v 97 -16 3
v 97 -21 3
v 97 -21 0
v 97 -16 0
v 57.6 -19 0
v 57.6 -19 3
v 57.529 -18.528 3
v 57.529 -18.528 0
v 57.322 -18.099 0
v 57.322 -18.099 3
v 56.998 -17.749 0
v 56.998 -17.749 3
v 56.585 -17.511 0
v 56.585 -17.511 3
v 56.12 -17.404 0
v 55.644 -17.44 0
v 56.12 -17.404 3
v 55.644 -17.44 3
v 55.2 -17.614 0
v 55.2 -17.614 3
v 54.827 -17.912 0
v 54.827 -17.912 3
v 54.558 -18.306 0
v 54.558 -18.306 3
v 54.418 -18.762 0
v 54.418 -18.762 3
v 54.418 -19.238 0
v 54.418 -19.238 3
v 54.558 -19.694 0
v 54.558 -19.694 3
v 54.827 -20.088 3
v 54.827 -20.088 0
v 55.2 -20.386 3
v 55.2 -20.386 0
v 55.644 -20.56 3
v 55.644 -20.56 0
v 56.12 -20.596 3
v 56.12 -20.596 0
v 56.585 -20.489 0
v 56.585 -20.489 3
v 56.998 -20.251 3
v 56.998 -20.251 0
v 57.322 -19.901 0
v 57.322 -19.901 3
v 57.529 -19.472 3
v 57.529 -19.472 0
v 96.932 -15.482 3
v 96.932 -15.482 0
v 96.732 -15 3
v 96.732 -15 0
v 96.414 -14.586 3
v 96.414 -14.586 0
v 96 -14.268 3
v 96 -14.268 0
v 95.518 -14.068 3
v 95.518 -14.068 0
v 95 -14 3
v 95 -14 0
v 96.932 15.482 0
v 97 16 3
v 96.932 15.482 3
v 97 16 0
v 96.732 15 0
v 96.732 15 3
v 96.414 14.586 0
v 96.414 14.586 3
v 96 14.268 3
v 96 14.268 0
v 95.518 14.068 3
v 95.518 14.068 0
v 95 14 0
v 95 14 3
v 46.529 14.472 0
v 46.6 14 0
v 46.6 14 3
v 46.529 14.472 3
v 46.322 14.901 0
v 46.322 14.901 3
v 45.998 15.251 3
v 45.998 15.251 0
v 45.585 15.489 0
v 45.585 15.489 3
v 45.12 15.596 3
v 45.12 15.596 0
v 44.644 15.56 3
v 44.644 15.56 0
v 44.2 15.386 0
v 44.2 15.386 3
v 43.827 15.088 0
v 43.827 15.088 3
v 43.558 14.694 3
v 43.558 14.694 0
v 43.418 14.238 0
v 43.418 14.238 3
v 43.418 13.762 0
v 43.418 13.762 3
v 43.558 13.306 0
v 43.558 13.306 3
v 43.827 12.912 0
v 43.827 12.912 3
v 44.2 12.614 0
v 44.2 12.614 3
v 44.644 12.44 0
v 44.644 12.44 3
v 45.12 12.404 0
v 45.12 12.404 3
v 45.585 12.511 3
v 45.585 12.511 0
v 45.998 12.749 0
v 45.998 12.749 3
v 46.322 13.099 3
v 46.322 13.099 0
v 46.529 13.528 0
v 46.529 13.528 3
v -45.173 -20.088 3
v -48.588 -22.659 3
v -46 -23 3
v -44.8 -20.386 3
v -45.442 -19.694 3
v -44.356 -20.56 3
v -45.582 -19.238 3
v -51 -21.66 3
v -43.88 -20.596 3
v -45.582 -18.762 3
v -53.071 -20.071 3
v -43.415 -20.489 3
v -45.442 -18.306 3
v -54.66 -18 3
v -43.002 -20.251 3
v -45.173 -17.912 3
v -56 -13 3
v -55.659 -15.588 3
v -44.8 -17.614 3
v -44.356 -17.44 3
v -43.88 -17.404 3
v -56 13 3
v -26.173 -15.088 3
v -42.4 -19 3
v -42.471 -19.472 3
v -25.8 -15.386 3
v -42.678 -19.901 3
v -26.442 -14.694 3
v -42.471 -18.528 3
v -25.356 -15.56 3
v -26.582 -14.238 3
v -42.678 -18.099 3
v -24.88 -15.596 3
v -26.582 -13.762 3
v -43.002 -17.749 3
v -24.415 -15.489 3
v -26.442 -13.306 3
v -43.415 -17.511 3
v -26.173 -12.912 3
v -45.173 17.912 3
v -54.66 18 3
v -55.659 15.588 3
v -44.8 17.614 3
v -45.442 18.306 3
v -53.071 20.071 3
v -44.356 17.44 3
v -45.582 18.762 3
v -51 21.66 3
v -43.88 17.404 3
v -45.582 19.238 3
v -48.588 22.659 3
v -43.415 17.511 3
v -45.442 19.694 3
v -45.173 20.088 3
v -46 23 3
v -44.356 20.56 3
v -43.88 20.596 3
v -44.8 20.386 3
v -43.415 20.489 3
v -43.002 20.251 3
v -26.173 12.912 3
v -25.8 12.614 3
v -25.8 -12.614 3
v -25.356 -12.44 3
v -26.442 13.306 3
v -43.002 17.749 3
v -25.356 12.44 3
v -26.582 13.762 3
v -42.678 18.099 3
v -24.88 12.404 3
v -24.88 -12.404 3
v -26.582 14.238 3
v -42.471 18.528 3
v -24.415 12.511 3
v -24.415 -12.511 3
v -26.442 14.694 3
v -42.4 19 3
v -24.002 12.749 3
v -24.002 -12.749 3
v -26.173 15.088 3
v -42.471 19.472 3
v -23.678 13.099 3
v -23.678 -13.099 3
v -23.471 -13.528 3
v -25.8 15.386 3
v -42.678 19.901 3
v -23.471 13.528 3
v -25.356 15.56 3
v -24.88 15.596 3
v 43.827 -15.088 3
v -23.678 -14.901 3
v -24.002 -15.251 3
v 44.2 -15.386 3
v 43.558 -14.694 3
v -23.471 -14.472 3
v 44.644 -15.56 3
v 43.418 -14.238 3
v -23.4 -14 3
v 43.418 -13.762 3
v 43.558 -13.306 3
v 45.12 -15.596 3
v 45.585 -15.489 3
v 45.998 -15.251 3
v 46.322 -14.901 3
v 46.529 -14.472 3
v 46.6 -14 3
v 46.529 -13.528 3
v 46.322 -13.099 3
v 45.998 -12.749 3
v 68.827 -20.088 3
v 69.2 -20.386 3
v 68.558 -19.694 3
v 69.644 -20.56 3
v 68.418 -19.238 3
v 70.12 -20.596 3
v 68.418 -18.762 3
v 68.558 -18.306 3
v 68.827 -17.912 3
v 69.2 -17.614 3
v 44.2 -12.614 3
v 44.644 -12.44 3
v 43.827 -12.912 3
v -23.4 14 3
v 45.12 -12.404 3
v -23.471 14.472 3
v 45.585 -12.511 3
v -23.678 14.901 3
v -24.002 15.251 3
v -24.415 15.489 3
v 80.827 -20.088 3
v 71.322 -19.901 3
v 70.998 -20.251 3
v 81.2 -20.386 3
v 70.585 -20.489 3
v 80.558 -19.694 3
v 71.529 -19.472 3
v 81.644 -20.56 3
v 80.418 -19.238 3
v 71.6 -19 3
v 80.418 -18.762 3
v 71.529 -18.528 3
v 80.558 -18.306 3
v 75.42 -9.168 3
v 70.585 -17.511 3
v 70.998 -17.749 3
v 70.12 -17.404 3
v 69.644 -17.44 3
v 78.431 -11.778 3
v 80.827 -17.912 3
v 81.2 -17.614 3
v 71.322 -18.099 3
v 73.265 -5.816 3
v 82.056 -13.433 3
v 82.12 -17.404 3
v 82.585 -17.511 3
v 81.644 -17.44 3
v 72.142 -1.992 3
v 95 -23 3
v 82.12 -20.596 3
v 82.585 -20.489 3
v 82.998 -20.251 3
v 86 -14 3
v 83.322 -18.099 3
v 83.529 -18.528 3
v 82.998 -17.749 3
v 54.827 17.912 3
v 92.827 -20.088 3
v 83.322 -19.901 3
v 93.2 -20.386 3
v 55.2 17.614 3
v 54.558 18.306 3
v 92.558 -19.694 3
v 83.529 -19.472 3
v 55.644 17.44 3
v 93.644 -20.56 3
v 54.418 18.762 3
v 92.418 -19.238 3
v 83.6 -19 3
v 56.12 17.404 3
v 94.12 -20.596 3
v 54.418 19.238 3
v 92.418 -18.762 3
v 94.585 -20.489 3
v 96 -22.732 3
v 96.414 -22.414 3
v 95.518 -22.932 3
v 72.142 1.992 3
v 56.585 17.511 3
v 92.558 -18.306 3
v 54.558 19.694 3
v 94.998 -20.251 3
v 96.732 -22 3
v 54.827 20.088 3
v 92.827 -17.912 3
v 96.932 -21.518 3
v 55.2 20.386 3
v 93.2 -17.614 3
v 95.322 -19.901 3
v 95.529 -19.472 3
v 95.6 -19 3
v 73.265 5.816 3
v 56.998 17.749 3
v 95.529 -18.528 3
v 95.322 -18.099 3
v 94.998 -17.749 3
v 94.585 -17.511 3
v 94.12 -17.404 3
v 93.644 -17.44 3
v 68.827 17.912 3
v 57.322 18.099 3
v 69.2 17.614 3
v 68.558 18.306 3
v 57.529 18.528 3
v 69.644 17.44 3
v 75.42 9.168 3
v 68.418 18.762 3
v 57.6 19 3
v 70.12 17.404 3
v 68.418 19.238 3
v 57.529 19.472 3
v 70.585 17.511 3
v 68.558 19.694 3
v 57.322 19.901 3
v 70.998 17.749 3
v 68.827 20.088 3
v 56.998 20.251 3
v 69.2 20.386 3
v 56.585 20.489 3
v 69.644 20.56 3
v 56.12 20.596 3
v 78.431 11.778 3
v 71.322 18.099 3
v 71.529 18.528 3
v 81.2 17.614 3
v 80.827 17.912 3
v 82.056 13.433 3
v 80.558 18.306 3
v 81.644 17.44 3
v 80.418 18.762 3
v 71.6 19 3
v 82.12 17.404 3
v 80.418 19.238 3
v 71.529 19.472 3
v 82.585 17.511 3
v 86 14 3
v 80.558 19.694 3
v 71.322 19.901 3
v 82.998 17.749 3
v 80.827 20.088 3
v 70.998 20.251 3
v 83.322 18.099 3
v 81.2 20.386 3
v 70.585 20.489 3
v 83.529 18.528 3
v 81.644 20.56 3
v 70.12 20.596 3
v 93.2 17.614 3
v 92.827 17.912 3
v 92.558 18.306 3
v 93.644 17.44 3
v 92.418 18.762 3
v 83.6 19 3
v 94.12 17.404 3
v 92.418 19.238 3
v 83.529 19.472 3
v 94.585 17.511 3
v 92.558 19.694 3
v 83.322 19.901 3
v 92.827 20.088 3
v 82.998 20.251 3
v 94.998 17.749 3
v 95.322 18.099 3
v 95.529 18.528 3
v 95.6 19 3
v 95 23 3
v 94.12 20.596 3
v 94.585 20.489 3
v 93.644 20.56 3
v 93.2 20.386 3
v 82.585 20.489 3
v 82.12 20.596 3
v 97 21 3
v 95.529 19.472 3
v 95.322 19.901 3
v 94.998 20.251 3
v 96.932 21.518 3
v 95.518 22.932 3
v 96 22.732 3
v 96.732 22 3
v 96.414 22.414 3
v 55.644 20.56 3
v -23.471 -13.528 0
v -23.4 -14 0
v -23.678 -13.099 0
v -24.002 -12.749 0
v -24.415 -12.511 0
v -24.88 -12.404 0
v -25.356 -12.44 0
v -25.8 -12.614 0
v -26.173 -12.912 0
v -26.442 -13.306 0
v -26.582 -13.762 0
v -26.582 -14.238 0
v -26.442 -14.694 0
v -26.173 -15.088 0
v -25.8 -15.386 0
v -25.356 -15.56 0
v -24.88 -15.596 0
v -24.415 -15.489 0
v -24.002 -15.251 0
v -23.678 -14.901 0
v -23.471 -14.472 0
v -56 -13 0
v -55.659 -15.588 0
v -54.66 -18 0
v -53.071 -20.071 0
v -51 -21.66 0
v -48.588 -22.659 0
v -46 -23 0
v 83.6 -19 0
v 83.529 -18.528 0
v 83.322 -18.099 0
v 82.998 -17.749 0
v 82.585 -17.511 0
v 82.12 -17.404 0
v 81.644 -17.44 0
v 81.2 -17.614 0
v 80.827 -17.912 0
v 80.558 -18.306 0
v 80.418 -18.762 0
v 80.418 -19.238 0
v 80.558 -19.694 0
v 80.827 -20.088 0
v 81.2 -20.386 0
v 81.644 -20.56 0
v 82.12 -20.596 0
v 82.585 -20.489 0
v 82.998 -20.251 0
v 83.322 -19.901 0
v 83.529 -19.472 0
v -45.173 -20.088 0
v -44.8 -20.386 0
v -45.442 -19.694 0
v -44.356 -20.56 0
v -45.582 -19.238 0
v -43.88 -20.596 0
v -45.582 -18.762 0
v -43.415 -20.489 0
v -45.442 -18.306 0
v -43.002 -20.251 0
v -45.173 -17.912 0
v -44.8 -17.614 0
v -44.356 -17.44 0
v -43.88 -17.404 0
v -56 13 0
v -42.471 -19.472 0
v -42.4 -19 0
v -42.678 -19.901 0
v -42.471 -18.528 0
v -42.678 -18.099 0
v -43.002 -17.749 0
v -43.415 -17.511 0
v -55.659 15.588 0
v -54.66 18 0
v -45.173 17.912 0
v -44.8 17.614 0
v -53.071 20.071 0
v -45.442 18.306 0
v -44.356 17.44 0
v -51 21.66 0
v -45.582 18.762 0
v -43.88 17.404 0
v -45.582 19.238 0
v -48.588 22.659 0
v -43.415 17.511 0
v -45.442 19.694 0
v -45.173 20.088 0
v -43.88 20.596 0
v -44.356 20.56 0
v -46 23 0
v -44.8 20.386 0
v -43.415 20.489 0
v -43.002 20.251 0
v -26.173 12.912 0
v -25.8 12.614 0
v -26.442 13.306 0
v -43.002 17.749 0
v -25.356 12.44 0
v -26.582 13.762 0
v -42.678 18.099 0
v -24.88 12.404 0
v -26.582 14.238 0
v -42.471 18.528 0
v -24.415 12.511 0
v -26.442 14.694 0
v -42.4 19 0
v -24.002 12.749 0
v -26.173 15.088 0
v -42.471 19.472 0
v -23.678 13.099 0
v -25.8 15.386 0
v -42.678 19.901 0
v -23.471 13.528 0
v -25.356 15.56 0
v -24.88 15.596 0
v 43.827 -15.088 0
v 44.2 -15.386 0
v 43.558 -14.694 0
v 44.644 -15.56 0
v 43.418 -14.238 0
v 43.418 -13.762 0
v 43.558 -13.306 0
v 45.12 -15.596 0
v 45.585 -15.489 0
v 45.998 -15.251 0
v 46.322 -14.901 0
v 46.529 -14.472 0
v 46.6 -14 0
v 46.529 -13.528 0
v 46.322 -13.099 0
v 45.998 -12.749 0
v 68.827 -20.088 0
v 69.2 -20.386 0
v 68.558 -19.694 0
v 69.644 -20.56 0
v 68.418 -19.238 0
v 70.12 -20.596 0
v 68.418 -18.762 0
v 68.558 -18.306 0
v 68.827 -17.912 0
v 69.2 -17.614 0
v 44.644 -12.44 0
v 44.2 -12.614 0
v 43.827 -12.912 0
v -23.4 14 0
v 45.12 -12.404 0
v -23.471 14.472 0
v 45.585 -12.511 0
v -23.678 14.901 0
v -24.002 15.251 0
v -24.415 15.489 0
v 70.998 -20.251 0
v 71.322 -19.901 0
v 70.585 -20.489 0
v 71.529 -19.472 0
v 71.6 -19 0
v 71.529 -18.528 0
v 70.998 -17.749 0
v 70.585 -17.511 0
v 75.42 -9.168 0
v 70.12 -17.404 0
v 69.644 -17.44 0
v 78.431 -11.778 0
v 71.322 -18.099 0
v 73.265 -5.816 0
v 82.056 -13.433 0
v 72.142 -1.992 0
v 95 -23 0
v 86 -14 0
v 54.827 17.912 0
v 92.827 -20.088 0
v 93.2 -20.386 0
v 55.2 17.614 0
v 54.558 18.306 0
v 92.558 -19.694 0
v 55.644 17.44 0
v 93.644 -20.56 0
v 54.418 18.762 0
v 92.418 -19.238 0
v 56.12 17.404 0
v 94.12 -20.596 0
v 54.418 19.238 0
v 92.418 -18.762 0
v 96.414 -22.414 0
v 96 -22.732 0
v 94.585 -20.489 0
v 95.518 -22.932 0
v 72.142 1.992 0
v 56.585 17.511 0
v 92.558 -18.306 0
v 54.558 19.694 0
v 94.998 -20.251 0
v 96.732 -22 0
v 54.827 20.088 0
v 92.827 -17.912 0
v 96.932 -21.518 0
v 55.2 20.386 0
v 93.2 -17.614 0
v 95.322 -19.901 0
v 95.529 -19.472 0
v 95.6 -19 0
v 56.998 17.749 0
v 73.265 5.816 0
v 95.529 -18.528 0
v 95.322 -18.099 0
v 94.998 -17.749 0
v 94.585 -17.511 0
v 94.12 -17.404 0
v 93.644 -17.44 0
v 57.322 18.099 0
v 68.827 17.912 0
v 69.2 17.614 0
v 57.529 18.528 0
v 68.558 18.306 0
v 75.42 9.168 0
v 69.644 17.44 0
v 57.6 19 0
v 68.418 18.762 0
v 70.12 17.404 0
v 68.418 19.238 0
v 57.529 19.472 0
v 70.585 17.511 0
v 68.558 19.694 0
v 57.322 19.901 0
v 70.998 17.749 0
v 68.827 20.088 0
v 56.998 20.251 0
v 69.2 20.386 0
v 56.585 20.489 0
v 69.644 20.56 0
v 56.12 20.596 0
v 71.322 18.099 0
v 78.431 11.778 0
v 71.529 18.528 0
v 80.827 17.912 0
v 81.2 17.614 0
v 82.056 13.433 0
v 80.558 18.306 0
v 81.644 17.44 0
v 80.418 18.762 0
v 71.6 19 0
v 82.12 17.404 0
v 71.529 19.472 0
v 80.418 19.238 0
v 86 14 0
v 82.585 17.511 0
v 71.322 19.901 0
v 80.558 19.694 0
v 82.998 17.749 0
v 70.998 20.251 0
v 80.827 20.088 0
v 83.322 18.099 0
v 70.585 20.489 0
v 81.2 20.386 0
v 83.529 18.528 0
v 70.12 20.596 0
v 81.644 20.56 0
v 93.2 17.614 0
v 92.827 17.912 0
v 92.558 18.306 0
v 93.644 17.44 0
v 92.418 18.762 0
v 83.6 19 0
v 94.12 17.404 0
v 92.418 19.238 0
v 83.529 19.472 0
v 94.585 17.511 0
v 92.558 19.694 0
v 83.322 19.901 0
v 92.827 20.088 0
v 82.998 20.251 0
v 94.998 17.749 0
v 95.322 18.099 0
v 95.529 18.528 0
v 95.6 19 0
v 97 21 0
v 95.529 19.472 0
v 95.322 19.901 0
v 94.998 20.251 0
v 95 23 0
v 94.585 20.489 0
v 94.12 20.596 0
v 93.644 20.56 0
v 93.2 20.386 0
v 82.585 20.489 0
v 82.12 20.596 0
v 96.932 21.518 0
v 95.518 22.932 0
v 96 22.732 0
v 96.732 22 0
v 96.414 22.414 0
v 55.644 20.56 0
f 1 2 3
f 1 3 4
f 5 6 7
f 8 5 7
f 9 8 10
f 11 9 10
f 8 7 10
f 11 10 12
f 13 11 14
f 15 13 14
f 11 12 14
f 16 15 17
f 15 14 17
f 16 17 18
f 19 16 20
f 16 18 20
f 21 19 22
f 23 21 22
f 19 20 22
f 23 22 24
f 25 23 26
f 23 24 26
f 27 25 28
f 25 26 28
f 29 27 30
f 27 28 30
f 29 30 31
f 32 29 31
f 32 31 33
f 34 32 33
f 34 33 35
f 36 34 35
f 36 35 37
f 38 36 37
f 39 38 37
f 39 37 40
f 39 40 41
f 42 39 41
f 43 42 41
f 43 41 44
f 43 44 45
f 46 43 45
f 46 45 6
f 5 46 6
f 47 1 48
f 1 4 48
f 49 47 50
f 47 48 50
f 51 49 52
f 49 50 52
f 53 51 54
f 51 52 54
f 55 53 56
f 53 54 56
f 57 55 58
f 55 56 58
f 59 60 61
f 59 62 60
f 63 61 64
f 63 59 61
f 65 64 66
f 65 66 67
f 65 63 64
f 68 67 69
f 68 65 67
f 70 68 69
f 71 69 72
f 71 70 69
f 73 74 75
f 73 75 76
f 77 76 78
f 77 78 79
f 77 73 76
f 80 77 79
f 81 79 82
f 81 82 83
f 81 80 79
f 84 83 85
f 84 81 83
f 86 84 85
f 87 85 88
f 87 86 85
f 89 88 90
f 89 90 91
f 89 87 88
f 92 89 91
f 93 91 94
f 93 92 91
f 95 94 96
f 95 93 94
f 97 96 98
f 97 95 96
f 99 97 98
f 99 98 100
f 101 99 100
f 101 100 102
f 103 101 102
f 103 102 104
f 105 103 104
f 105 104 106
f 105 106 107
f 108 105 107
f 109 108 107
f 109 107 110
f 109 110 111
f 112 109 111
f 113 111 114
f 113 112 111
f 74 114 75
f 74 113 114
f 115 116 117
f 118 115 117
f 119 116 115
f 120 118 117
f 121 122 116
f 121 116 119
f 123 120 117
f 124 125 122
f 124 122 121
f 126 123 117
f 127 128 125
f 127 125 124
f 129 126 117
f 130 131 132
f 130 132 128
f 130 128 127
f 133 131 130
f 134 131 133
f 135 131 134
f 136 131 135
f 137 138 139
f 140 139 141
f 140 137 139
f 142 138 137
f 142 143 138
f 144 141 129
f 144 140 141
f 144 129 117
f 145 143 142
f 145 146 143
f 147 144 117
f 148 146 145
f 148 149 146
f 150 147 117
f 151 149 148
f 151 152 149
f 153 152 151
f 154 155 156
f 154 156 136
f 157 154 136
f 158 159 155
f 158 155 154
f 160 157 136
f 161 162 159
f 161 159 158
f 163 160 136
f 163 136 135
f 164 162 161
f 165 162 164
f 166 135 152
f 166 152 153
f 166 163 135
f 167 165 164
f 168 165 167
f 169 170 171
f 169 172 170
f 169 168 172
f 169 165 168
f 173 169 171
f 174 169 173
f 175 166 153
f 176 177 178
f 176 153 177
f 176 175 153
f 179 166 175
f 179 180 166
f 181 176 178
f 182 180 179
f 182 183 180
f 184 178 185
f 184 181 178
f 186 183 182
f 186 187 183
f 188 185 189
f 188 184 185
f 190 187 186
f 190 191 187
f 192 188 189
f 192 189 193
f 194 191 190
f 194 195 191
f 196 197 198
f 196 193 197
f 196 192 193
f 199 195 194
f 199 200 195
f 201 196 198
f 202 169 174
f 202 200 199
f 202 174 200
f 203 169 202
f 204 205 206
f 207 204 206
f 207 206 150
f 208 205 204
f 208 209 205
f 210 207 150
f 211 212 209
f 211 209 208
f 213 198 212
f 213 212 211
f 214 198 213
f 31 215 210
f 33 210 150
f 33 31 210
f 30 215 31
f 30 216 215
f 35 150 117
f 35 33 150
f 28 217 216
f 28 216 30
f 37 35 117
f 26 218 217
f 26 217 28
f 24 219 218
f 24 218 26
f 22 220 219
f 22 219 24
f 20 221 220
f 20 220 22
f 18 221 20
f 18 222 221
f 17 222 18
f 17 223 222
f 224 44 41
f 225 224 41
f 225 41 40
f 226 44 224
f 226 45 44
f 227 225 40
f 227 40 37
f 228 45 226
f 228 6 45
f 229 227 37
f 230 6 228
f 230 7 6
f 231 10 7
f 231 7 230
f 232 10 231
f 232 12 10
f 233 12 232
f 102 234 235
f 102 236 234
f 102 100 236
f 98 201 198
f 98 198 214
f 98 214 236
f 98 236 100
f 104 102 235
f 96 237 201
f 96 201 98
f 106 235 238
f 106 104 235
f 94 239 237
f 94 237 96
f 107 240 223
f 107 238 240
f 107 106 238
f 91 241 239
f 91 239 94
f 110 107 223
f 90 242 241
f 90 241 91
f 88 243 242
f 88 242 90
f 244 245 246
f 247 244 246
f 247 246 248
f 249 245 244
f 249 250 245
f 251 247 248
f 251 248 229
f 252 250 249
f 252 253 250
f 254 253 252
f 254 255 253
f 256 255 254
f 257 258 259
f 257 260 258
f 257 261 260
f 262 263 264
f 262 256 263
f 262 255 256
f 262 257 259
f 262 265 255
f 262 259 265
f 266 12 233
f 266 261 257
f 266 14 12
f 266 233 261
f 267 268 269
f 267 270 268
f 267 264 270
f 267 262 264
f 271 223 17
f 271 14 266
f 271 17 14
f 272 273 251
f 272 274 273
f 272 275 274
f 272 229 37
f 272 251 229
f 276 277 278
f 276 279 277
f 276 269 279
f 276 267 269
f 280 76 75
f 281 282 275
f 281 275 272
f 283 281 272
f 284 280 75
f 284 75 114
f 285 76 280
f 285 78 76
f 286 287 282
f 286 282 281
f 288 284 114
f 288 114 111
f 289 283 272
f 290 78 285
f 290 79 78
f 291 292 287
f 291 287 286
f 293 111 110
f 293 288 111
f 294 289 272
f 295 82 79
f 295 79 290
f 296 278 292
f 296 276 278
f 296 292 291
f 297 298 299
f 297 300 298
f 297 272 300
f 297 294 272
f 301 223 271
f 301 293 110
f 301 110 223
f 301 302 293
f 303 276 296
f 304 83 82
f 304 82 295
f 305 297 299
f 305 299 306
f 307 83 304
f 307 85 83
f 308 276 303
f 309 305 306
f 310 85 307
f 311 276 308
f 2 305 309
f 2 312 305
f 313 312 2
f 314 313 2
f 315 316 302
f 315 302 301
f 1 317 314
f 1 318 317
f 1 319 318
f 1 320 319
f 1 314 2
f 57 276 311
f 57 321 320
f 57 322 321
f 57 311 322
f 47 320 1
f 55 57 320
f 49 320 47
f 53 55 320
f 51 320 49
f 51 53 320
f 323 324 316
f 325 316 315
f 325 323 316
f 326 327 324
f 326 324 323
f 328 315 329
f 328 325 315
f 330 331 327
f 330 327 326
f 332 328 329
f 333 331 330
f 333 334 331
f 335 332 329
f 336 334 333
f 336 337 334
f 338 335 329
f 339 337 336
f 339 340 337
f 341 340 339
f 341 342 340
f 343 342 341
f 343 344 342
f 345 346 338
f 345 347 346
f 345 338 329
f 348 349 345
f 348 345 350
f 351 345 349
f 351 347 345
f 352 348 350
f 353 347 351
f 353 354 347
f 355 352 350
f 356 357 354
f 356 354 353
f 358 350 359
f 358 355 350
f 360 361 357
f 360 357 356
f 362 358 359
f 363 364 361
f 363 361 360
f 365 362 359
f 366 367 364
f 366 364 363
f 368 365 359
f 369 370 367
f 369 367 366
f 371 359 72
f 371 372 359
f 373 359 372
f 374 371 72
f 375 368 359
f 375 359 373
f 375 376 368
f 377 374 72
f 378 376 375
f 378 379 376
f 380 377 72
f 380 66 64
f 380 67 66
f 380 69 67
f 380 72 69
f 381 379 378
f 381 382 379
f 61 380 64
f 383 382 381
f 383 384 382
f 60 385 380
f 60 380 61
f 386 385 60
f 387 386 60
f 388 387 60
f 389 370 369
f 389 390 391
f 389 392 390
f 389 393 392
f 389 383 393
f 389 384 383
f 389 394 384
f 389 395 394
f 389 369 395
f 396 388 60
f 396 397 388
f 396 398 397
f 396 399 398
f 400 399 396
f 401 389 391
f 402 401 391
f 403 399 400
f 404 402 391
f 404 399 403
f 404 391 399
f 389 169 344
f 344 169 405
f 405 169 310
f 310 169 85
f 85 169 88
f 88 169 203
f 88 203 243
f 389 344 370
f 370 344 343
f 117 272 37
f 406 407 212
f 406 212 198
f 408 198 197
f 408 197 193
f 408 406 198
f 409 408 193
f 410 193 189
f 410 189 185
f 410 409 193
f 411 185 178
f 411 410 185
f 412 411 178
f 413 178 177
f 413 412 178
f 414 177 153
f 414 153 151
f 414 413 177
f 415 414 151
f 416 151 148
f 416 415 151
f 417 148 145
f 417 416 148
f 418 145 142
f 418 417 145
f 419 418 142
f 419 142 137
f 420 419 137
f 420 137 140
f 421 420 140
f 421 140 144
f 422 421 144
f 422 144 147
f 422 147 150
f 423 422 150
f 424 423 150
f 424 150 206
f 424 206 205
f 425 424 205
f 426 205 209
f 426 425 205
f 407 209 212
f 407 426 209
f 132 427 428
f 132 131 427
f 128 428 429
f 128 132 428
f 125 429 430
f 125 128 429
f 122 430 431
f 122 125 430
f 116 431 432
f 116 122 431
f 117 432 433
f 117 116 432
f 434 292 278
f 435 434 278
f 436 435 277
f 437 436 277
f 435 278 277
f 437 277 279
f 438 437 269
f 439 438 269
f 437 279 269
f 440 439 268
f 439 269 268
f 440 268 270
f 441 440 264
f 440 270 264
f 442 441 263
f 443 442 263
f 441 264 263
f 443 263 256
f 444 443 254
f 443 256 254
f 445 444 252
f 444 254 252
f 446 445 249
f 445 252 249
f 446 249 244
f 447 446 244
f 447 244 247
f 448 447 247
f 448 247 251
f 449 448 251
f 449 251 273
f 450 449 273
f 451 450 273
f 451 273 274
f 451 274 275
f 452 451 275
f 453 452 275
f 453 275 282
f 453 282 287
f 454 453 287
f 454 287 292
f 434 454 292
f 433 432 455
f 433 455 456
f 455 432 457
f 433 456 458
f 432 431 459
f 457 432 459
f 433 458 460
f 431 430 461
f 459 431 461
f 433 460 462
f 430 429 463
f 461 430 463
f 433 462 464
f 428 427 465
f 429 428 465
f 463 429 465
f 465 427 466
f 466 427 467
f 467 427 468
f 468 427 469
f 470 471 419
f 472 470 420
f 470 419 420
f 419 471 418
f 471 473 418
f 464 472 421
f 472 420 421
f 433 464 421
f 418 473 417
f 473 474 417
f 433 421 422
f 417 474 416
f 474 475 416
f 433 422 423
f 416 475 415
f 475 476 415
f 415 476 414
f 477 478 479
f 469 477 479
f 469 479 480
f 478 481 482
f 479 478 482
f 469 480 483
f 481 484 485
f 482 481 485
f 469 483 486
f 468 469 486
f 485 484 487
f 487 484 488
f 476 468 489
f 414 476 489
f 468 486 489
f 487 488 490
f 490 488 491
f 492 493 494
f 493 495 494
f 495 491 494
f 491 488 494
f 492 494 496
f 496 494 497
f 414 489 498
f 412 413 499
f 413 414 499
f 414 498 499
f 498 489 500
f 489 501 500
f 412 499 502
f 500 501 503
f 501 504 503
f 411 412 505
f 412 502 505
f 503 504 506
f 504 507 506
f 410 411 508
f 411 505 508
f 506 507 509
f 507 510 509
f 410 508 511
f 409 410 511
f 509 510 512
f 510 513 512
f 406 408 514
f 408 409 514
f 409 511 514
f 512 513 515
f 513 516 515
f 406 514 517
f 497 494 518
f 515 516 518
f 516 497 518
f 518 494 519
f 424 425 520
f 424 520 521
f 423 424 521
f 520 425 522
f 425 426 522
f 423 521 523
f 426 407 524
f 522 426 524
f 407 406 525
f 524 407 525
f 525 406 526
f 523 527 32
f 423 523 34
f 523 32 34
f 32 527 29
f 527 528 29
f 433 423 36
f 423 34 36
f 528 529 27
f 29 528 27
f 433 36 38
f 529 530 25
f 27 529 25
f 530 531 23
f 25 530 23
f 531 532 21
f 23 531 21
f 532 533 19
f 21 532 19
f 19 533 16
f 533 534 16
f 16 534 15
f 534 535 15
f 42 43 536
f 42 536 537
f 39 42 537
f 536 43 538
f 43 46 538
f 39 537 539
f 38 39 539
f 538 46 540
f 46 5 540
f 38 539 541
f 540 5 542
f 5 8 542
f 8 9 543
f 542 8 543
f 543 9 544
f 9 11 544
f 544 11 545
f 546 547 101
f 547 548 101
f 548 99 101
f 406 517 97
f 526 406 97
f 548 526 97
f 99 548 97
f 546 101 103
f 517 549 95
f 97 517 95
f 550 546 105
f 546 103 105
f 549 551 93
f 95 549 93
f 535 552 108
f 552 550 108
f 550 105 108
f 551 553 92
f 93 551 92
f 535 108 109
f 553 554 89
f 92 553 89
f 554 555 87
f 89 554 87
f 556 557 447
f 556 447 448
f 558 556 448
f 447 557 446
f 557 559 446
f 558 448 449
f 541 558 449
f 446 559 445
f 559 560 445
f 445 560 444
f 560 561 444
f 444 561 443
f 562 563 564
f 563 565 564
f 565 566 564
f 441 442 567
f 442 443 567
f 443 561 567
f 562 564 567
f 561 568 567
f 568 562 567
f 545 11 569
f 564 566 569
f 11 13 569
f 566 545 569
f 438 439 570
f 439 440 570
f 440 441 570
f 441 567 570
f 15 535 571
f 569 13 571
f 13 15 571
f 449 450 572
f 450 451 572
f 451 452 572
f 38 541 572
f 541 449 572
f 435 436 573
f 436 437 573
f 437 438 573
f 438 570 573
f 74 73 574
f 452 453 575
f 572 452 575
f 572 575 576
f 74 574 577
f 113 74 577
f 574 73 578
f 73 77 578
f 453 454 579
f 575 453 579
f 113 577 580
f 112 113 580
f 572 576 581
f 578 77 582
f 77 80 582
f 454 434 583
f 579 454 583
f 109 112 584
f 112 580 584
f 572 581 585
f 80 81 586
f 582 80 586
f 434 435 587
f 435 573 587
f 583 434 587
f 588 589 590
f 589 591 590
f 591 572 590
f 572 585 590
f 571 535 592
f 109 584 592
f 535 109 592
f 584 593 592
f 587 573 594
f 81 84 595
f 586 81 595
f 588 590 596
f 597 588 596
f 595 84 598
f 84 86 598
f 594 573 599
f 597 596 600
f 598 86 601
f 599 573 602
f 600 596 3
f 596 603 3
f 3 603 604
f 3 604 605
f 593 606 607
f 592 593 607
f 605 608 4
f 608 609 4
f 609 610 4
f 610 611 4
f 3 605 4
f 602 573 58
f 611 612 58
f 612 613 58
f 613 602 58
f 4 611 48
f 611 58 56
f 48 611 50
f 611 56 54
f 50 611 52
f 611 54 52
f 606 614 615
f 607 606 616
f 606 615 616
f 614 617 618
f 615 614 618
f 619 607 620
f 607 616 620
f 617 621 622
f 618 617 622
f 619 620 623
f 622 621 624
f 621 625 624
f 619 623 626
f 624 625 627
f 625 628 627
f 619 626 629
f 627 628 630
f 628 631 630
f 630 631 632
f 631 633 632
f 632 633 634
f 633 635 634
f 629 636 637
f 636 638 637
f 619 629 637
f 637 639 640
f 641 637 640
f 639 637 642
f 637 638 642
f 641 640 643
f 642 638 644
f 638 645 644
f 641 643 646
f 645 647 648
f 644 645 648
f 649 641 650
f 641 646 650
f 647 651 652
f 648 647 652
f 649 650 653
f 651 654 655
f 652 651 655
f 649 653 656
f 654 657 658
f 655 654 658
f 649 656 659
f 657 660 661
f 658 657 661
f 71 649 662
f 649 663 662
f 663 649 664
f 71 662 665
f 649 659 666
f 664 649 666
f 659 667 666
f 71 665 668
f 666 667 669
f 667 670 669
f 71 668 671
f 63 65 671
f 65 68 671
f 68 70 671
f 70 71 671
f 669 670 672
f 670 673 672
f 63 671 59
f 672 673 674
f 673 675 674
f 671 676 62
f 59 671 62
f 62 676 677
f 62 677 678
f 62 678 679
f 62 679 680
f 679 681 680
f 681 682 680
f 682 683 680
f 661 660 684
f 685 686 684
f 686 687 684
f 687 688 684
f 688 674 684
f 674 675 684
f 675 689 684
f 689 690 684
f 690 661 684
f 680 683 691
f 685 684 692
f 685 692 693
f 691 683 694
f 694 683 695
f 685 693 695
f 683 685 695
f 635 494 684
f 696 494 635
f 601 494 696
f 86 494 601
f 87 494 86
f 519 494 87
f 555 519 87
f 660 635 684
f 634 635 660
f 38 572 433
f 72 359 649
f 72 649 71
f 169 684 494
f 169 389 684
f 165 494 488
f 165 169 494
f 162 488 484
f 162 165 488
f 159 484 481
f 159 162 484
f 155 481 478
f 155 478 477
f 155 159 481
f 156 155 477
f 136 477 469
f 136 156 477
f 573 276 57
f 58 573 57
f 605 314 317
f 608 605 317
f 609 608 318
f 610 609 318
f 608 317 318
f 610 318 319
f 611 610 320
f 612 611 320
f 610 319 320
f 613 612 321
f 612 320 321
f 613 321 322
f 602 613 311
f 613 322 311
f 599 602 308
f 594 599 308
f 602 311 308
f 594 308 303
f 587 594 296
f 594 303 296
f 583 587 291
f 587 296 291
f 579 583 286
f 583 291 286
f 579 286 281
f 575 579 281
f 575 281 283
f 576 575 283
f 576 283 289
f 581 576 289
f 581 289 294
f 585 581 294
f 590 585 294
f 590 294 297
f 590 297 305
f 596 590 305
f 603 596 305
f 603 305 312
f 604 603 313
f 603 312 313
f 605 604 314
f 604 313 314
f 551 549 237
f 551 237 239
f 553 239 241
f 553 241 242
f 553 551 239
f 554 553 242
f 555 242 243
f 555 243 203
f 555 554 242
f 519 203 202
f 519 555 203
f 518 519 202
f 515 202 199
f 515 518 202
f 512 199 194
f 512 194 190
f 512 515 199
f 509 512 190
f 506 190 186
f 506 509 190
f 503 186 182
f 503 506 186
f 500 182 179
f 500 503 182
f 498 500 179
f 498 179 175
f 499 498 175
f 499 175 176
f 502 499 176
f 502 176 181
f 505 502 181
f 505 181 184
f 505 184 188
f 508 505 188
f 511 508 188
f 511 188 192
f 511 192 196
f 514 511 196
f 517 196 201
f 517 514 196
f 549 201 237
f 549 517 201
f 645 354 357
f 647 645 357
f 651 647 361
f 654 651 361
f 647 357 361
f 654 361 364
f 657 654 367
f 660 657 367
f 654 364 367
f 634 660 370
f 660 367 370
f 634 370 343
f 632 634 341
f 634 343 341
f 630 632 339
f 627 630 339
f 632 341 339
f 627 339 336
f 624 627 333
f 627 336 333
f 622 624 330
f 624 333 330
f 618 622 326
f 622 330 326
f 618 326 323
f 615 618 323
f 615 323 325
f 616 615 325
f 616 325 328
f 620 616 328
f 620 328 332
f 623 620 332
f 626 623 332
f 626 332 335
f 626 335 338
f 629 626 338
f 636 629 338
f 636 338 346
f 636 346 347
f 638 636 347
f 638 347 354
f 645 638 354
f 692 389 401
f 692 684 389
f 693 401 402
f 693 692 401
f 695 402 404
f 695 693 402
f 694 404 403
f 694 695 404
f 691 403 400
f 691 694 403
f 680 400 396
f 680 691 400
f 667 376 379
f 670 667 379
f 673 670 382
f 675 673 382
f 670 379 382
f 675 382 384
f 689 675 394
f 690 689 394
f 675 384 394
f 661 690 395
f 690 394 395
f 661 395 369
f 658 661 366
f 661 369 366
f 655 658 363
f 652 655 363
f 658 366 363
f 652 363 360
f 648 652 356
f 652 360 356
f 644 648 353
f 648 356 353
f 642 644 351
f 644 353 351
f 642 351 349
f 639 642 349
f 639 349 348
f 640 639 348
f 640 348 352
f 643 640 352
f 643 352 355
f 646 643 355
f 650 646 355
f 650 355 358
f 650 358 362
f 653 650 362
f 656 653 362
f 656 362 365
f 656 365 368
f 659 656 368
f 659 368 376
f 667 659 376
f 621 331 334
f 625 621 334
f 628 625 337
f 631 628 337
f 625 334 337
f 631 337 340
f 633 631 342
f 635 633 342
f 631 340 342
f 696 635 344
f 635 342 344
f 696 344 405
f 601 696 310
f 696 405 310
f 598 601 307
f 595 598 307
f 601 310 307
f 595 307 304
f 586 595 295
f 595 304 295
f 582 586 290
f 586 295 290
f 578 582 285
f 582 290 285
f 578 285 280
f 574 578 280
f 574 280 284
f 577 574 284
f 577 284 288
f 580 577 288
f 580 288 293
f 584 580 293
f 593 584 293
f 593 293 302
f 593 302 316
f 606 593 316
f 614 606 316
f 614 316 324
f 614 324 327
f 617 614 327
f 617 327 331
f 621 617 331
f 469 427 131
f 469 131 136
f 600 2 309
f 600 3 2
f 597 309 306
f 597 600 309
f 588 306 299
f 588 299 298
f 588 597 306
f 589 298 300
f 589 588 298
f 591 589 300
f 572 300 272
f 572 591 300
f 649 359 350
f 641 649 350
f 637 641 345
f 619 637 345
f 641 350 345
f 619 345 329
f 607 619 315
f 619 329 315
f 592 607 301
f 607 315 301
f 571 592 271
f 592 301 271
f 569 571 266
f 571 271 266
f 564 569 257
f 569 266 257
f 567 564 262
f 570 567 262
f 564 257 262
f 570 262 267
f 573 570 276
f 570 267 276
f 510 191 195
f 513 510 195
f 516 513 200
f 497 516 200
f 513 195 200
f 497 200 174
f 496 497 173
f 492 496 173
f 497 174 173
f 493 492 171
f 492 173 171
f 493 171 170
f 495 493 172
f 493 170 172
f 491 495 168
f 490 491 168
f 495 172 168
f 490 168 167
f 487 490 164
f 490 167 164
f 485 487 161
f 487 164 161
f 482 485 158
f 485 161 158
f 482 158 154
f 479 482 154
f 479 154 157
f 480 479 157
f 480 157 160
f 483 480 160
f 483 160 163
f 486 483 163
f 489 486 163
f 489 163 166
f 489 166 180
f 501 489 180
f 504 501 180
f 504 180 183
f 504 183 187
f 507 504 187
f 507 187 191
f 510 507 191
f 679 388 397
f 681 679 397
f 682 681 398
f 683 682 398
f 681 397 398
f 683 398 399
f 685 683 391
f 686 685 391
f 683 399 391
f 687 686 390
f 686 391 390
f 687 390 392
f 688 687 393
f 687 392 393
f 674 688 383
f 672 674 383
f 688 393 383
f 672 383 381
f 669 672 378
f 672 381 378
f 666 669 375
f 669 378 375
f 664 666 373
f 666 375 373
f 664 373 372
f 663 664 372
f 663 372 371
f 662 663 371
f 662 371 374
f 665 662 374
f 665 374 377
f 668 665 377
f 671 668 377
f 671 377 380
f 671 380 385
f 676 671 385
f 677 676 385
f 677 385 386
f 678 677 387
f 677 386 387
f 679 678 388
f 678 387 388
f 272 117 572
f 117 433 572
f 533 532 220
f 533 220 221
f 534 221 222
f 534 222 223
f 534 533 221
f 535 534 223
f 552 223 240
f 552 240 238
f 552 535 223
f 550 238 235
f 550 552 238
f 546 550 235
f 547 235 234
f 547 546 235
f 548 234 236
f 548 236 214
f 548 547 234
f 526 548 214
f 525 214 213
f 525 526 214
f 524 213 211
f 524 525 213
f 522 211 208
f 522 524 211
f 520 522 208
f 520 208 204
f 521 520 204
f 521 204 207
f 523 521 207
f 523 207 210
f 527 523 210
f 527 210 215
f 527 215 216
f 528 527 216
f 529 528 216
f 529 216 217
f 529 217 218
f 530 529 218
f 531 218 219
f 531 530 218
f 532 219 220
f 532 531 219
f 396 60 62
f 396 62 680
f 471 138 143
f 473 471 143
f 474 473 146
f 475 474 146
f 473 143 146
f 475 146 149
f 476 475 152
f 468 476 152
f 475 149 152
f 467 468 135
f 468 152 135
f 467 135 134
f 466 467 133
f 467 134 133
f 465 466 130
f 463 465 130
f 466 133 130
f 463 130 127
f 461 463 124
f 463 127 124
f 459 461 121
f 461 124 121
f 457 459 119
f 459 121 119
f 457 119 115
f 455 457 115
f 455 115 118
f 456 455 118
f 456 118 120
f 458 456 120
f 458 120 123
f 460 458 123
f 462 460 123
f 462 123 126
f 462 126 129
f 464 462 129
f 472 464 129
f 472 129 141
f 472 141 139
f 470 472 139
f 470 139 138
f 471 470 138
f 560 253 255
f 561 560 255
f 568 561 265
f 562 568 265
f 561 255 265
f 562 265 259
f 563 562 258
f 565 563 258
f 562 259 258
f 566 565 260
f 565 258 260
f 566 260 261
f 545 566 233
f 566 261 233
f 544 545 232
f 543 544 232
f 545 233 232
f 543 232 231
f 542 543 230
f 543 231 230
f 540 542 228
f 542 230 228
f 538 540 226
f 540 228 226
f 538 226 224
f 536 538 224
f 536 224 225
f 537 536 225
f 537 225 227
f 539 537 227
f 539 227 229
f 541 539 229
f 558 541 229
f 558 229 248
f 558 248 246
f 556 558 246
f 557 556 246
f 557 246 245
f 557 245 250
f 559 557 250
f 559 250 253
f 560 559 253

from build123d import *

# Parameters (mm, degrees)
SKETCH2_W           = 142
SKETCH2_H           = 46
SKETCH2_R           = 1.6
BOSS_EXTRUDE1_DEPTH = 3
SKETCH3_R           = 1.6
CUT_EXTRUDE1_DEPTH  = 4
SKETCH3_3_R         = 1.6
SKETCH3_3_W         = 11
SKETCH3_3_H         = 9
BOSS_EXTRUDE2_DEPTH = 3
FILLET2_R           = 2
FILLET3_R           = 2
FILLET4_R           = 10


with BuildPart() as part:
    # Sketch2 → Boss-Extrude1 (new body)
    with BuildSketch(Plane.XY):
        with Locations((15, 0)):
            Rectangle(SKETCH2_W, SKETCH2_H)
        with Locations((-25, -14)):
            Circle(SKETCH2_R, mode=Mode.SUBTRACT)
        with Locations((45, -14)):
            Circle(SKETCH2_R, mode=Mode.SUBTRACT)
        with Locations((-25, 14)):
            Circle(SKETCH2_R, mode=Mode.SUBTRACT)
        with Locations((45, 14)):
            Circle(SKETCH2_R, mode=Mode.SUBTRACT)
    extrude(amount=BOSS_EXTRUDE1_DEPTH)

    # Sketch3 → Cut-Extrude1 (cut, through all)
    with BuildSketch(Plane.XY.offset(3)):
        with BuildLine():
            Line((86, -14), (86, 14))
            ThreePointArc((86, 14), (72, 0), (86, -14))
        make_face()
        with Locations((82, 19)):
            Circle(SKETCH3_R)
        with Locations((56, 19)):
            Circle(SKETCH3_R)
        with Locations((-44, 19)):
            Circle(SKETCH3_R)
        with Locations((70, 19)):
            Circle(SKETCH3_R)
        with Locations((82, -19)):
            Circle(SKETCH3_R)
        with Locations((70, -19)):
            Circle(SKETCH3_R)
        with Locations((-44, -19)):
            Circle(SKETCH3_R)
        with Locations((56, -19)):
            Circle(SKETCH3_R)
    extrude(amount=-CUT_EXTRUDE1_DEPTH, mode=Mode.SUBTRACT)

    # Sketch3<3> → Boss-Extrude2 (add)
    with BuildSketch(Plane.XY.offset(3)):
        Polygon((97, 23), (86, 23), (86, 19), (86, 14), (97, 14), align=None)
        with Locations((94, 19)):
            Circle(SKETCH3_3_R, mode=Mode.SUBTRACT)
        with Locations((91.5, -18.5)):
            Rectangle(SKETCH3_3_W, SKETCH3_3_H)
        with Locations((94, -19)):
            Circle(SKETCH3_3_R, mode=Mode.SUBTRACT)
    extrude(amount=-BOSS_EXTRUDE2_DEPTH)

    # Fillet2
    fillet2_edges = [part.edges().sort_by_distance(p)[0] for p in [
        (97, 23, 1.5),
        (97, -23, 1.5),
    ]]
    fillet(fillet2_edges, radius=FILLET2_R)

    # Fillet3
    fillet3_edges = [part.edges().sort_by_distance(p)[0] for p in [
        (97, 14, 1.5),
        (97, -14, 1.5),
    ]]
    fillet(fillet3_edges, radius=FILLET3_R)

    # Fillet4
    fillet4_edges = [part.edges().sort_by_distance(p)[0] for p in [
        (-56, 23, 1.5),
        (-56, -23, 1.5),
    ]]
    fillet(fillet4_edges, radius=FILLET4_R)


solid = part.part
